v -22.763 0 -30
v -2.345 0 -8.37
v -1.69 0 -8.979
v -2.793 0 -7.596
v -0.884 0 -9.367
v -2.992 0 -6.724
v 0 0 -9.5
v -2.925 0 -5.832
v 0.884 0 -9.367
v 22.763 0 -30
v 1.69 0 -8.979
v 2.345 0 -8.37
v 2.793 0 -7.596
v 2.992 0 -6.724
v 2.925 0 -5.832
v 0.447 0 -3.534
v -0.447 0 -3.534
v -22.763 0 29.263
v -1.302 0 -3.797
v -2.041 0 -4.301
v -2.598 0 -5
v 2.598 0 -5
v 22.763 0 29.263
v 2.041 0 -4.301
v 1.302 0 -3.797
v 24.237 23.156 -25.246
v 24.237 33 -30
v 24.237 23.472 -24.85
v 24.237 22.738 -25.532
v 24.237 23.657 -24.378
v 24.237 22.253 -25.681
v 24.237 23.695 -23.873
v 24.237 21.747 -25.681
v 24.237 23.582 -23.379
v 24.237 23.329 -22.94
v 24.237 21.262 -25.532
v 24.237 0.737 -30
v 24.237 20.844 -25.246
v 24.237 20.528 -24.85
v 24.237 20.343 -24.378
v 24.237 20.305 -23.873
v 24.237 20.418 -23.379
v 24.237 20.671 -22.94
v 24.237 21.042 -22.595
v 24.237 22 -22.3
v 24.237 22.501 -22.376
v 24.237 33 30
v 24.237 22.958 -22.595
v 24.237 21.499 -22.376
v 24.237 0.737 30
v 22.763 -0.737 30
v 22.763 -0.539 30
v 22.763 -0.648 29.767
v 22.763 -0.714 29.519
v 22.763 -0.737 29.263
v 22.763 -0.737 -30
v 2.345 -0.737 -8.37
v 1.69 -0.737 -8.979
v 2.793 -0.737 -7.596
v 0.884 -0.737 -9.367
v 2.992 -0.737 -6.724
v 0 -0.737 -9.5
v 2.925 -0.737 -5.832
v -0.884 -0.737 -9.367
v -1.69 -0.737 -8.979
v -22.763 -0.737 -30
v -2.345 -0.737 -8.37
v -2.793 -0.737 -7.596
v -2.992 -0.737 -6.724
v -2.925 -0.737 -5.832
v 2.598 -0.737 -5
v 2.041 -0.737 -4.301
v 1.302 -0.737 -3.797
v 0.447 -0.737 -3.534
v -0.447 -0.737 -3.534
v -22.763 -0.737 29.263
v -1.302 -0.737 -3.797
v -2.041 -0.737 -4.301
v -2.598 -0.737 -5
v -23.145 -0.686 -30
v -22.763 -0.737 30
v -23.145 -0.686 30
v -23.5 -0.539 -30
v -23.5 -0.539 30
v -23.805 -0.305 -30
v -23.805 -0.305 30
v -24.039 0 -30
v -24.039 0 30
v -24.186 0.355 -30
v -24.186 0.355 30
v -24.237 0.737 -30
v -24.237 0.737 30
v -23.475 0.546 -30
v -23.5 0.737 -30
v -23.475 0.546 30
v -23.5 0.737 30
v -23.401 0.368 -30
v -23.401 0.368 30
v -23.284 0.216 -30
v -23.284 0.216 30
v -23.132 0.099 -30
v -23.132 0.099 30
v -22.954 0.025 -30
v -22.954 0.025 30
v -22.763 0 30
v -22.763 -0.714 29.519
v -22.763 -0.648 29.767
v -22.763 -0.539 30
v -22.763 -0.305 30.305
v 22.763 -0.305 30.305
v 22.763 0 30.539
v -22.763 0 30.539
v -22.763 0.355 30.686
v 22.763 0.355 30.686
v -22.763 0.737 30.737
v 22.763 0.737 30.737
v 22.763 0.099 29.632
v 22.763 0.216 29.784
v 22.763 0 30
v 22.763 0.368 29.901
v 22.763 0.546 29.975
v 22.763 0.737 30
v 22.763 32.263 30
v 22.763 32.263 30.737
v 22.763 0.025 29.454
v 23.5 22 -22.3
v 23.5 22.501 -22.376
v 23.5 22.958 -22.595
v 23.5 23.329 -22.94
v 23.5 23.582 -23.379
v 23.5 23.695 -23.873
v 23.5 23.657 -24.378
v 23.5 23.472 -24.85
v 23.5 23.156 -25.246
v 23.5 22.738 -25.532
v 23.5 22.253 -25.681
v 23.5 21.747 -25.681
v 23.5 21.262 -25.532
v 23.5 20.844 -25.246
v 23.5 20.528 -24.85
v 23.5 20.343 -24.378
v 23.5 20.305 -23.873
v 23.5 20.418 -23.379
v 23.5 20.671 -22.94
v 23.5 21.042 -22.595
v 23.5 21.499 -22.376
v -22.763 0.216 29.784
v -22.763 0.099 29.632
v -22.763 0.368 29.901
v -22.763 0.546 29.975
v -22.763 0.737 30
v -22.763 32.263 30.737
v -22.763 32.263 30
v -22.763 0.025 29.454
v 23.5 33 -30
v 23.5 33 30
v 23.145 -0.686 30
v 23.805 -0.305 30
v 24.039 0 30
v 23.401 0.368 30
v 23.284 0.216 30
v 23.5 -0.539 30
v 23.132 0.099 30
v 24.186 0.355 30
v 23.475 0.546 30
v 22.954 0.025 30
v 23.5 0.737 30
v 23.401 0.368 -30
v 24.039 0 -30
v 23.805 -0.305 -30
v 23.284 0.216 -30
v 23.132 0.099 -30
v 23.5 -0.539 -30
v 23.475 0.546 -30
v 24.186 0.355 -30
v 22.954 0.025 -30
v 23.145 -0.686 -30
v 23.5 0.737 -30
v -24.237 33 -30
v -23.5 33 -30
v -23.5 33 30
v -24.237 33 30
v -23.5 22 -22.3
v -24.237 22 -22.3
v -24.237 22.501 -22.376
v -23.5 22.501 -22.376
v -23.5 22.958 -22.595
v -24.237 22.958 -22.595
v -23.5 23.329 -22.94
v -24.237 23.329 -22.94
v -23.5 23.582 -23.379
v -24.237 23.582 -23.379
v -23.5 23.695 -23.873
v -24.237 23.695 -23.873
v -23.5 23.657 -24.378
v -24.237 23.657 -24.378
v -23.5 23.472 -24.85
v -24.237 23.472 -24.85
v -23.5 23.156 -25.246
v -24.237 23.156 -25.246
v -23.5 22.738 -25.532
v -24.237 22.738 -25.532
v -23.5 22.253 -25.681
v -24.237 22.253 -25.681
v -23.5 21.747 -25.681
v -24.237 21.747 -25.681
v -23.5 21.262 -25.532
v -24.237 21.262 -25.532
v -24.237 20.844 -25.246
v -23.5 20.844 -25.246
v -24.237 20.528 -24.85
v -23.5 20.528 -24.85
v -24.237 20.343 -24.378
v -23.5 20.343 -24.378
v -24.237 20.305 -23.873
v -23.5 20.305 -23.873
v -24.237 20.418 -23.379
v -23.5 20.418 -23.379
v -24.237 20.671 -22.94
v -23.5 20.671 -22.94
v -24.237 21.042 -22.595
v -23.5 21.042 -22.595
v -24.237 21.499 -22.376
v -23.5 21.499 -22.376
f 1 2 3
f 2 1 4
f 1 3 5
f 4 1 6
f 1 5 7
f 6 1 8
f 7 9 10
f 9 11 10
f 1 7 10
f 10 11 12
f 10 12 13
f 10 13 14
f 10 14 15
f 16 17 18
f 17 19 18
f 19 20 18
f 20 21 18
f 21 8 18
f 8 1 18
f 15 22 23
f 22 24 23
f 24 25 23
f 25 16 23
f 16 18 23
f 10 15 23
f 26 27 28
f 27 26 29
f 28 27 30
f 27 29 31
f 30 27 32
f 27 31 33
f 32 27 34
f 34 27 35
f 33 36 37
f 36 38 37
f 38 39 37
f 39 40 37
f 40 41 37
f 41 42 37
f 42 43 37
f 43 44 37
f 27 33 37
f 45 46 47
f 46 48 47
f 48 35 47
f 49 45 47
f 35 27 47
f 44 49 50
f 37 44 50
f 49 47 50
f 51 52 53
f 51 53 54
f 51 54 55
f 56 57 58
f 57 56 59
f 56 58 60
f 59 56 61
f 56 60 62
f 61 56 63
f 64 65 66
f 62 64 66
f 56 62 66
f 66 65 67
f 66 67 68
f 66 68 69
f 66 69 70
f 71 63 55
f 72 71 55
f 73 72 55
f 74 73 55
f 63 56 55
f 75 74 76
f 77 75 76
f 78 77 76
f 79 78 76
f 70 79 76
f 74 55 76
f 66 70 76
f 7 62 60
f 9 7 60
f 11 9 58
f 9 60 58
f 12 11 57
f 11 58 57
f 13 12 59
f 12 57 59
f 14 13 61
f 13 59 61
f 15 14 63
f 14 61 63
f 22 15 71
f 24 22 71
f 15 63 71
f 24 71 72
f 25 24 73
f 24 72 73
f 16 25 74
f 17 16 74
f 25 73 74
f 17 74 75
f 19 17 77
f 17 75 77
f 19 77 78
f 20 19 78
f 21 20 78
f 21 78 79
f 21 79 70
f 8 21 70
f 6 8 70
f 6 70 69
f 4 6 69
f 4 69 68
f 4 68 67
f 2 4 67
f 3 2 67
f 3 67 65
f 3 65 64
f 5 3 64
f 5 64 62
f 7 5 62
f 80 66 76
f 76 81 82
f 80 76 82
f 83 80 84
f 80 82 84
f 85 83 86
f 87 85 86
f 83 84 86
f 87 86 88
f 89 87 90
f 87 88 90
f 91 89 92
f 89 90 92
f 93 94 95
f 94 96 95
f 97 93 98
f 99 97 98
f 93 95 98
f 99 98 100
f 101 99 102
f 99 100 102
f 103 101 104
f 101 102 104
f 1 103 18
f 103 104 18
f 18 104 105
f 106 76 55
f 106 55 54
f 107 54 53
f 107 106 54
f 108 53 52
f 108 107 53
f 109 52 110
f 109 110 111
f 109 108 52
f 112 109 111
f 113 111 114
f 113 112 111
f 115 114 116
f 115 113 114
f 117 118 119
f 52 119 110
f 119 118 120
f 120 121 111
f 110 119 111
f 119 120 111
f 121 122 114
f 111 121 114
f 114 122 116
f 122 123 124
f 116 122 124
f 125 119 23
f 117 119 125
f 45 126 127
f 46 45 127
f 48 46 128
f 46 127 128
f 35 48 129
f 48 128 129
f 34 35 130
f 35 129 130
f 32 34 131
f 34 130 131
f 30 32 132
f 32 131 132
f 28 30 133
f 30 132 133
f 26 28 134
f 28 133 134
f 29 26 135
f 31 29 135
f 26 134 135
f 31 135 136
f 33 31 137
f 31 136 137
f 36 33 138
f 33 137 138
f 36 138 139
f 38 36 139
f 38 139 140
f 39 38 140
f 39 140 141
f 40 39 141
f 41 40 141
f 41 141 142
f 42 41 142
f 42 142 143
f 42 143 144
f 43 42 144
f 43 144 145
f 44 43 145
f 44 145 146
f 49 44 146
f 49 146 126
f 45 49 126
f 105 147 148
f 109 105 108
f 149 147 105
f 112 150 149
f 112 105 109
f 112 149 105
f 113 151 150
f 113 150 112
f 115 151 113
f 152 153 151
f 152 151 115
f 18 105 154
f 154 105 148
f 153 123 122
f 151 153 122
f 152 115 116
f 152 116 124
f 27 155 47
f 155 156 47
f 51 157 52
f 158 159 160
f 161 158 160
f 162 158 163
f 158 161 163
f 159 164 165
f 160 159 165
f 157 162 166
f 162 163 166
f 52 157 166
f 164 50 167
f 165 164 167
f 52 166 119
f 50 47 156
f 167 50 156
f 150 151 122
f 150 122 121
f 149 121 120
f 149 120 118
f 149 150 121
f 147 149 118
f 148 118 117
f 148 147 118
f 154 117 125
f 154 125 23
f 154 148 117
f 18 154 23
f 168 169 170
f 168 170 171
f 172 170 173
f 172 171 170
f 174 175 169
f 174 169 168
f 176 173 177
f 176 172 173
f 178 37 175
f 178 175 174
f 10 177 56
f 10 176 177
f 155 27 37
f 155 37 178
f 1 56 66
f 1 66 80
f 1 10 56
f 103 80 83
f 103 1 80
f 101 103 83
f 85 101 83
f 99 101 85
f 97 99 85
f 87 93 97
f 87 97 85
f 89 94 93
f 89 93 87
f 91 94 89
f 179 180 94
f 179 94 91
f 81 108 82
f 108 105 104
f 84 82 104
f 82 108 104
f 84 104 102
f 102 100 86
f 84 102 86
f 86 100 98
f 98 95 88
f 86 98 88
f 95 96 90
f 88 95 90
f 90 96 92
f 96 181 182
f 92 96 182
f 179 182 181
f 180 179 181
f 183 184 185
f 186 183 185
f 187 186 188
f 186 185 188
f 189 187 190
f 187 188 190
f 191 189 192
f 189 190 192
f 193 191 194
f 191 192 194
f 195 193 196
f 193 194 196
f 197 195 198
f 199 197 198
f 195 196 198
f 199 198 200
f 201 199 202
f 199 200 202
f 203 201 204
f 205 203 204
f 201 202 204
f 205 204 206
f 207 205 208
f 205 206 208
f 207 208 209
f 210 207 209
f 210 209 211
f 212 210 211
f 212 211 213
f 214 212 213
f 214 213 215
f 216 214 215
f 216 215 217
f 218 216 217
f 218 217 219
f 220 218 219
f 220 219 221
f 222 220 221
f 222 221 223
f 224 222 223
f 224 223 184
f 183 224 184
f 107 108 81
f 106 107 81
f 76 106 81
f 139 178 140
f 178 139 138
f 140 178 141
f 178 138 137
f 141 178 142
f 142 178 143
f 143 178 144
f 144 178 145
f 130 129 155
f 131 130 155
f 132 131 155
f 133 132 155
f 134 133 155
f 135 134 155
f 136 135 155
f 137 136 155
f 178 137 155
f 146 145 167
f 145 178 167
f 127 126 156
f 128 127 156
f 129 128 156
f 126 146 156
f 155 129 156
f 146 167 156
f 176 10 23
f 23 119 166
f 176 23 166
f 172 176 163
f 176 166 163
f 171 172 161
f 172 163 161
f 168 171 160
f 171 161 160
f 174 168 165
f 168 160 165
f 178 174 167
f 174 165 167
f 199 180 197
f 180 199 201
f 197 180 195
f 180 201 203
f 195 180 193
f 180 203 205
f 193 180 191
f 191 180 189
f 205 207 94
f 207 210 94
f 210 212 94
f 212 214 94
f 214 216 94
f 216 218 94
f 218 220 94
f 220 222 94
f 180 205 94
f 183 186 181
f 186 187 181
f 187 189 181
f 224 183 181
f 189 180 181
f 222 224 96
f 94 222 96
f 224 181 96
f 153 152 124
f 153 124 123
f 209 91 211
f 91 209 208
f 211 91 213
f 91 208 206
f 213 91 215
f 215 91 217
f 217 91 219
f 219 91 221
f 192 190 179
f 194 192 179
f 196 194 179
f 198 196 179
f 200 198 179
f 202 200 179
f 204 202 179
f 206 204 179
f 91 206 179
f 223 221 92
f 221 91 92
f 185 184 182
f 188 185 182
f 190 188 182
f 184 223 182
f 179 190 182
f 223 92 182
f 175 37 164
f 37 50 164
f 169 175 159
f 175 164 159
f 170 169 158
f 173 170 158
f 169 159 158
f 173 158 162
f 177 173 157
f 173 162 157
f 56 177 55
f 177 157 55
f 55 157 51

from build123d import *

# Parameters (mm, degrees)
BASE_FLANGE1_DEPTH           = 30
EDGE_FLANGE1_STRIP_W         = 4.4196
EDGE_FLANGE1_STRIP_H         = 0.7366
EDGE_FLANGE1_STRIP_CUT_DEPTH = 45.5268
EDGE_FLANGE1_DEPTH           = 45.5268
M3_CLEARANCE_HOLE1_D         = 3.4
SKETCH13_R                   = 3
CUT_EXTRUDE2_DEPTH           = 52.675037868


# Sheet-metal steps are written as plain solids
with BuildPart() as part:
    # Sketch1 → Base-Flange1 (new, symmetric)
    with BuildSketch(Plane.XY):
        with BuildLine():
            Line((-23.5, 33), (-23.5, 0.7366))
            ThreePointArc((-23.5, 0.7366), (-23.284254855, 0.215745145), (-22.7634, 0))
            Line((-22.7634, 0), (22.7634, 0))
            ThreePointArc((22.7634, 0), (23.284254855, 0.215745145), (23.5, 0.7366))
            Line((23.5, 0.7366), (23.5, 33))
            Line((23.5, 33), (24.2366, 33))
            Line((24.2366, 33), (24.2366, 0.7366))
            ThreePointArc((24.2366, 0.7366), (23.80510971, -0.30510971), (22.7634, -0.7366))
            Line((22.7634, -0.7366), (-22.7634, -0.7366))
            ThreePointArc((-22.7634, -0.7366), (-23.80510971, -0.30510971), (-24.2366, 0.7366))
            Line((-24.2366, 0.7366), (-24.2366, 33))
            Line((-24.2366, 33), (-23.5, 33))
        make_face()
    extrude(amount=BASE_FLANGE1_DEPTH, both=True)

    # Edge-Flange1 strip (across the edge) → Edge-Flange1 strip cut (cut)
    with BuildSketch(Plane(origin=(-22.7634, 0, 30), x_dir=(0, 0, -1), z_dir=(1, 0, 0))):
        with Locations((-1.4732, -0.3683)):
            Rectangle(EDGE_FLANGE1_STRIP_W, EDGE_FLANGE1_STRIP_H)
    extrude(amount=EDGE_FLANGE1_STRIP_CUT_DEPTH, mode=Mode.SUBTRACT)

    # Edge-Flange1 section (across the edge) → Edge-Flange1 (add)
    with BuildSketch(Plane(origin=(-22.7634, 0, 30), x_dir=(0, 0, -1), z_dir=(1, 0, 0))):
        with BuildLine():
            Line((-0.7366, 0.7366), (-0.7366, 32.2634))
            Line((-0.7366, 32.2634), (0, 32.2634))
            Line((0, 32.2634), (0, 0.7366))
            ThreePointArc((0, 0.7366), (0.215745145, 0.215745145), (0.7366, 0))
            Line((0.7366, 0), (0.7366, -0.7366))
            ThreePointArc((0.7366, -0.7366), (-0.30510971, -0.30510971), (-0.7366, 0.7366))
        make_face()
    extrude(amount=EDGE_FLANGE1_DEPTH)

    # M3 Clearance Hole1 (through all)
    with Locations(Plane(origin=(24.2366, 0, 0), x_dir=(0, 0, -1), z_dir=(1, 0, 0))):
        with Locations((24, 22)):
            Hole(M3_CLEARANCE_HOLE1_D / 2)

    # Sketch13 → Cut-Extrude2 (cut, through all)
    with BuildSketch(Plane.XZ.offset(0.7366)):
        with Locations(Location((0, -6.5, 0), (0, 0, 270))):
            Circle(SKETCH13_R)
    extrude(amount=-CUT_EXTRUDE2_DEPTH, mode=Mode.SUBTRACT)


solid = part.part
